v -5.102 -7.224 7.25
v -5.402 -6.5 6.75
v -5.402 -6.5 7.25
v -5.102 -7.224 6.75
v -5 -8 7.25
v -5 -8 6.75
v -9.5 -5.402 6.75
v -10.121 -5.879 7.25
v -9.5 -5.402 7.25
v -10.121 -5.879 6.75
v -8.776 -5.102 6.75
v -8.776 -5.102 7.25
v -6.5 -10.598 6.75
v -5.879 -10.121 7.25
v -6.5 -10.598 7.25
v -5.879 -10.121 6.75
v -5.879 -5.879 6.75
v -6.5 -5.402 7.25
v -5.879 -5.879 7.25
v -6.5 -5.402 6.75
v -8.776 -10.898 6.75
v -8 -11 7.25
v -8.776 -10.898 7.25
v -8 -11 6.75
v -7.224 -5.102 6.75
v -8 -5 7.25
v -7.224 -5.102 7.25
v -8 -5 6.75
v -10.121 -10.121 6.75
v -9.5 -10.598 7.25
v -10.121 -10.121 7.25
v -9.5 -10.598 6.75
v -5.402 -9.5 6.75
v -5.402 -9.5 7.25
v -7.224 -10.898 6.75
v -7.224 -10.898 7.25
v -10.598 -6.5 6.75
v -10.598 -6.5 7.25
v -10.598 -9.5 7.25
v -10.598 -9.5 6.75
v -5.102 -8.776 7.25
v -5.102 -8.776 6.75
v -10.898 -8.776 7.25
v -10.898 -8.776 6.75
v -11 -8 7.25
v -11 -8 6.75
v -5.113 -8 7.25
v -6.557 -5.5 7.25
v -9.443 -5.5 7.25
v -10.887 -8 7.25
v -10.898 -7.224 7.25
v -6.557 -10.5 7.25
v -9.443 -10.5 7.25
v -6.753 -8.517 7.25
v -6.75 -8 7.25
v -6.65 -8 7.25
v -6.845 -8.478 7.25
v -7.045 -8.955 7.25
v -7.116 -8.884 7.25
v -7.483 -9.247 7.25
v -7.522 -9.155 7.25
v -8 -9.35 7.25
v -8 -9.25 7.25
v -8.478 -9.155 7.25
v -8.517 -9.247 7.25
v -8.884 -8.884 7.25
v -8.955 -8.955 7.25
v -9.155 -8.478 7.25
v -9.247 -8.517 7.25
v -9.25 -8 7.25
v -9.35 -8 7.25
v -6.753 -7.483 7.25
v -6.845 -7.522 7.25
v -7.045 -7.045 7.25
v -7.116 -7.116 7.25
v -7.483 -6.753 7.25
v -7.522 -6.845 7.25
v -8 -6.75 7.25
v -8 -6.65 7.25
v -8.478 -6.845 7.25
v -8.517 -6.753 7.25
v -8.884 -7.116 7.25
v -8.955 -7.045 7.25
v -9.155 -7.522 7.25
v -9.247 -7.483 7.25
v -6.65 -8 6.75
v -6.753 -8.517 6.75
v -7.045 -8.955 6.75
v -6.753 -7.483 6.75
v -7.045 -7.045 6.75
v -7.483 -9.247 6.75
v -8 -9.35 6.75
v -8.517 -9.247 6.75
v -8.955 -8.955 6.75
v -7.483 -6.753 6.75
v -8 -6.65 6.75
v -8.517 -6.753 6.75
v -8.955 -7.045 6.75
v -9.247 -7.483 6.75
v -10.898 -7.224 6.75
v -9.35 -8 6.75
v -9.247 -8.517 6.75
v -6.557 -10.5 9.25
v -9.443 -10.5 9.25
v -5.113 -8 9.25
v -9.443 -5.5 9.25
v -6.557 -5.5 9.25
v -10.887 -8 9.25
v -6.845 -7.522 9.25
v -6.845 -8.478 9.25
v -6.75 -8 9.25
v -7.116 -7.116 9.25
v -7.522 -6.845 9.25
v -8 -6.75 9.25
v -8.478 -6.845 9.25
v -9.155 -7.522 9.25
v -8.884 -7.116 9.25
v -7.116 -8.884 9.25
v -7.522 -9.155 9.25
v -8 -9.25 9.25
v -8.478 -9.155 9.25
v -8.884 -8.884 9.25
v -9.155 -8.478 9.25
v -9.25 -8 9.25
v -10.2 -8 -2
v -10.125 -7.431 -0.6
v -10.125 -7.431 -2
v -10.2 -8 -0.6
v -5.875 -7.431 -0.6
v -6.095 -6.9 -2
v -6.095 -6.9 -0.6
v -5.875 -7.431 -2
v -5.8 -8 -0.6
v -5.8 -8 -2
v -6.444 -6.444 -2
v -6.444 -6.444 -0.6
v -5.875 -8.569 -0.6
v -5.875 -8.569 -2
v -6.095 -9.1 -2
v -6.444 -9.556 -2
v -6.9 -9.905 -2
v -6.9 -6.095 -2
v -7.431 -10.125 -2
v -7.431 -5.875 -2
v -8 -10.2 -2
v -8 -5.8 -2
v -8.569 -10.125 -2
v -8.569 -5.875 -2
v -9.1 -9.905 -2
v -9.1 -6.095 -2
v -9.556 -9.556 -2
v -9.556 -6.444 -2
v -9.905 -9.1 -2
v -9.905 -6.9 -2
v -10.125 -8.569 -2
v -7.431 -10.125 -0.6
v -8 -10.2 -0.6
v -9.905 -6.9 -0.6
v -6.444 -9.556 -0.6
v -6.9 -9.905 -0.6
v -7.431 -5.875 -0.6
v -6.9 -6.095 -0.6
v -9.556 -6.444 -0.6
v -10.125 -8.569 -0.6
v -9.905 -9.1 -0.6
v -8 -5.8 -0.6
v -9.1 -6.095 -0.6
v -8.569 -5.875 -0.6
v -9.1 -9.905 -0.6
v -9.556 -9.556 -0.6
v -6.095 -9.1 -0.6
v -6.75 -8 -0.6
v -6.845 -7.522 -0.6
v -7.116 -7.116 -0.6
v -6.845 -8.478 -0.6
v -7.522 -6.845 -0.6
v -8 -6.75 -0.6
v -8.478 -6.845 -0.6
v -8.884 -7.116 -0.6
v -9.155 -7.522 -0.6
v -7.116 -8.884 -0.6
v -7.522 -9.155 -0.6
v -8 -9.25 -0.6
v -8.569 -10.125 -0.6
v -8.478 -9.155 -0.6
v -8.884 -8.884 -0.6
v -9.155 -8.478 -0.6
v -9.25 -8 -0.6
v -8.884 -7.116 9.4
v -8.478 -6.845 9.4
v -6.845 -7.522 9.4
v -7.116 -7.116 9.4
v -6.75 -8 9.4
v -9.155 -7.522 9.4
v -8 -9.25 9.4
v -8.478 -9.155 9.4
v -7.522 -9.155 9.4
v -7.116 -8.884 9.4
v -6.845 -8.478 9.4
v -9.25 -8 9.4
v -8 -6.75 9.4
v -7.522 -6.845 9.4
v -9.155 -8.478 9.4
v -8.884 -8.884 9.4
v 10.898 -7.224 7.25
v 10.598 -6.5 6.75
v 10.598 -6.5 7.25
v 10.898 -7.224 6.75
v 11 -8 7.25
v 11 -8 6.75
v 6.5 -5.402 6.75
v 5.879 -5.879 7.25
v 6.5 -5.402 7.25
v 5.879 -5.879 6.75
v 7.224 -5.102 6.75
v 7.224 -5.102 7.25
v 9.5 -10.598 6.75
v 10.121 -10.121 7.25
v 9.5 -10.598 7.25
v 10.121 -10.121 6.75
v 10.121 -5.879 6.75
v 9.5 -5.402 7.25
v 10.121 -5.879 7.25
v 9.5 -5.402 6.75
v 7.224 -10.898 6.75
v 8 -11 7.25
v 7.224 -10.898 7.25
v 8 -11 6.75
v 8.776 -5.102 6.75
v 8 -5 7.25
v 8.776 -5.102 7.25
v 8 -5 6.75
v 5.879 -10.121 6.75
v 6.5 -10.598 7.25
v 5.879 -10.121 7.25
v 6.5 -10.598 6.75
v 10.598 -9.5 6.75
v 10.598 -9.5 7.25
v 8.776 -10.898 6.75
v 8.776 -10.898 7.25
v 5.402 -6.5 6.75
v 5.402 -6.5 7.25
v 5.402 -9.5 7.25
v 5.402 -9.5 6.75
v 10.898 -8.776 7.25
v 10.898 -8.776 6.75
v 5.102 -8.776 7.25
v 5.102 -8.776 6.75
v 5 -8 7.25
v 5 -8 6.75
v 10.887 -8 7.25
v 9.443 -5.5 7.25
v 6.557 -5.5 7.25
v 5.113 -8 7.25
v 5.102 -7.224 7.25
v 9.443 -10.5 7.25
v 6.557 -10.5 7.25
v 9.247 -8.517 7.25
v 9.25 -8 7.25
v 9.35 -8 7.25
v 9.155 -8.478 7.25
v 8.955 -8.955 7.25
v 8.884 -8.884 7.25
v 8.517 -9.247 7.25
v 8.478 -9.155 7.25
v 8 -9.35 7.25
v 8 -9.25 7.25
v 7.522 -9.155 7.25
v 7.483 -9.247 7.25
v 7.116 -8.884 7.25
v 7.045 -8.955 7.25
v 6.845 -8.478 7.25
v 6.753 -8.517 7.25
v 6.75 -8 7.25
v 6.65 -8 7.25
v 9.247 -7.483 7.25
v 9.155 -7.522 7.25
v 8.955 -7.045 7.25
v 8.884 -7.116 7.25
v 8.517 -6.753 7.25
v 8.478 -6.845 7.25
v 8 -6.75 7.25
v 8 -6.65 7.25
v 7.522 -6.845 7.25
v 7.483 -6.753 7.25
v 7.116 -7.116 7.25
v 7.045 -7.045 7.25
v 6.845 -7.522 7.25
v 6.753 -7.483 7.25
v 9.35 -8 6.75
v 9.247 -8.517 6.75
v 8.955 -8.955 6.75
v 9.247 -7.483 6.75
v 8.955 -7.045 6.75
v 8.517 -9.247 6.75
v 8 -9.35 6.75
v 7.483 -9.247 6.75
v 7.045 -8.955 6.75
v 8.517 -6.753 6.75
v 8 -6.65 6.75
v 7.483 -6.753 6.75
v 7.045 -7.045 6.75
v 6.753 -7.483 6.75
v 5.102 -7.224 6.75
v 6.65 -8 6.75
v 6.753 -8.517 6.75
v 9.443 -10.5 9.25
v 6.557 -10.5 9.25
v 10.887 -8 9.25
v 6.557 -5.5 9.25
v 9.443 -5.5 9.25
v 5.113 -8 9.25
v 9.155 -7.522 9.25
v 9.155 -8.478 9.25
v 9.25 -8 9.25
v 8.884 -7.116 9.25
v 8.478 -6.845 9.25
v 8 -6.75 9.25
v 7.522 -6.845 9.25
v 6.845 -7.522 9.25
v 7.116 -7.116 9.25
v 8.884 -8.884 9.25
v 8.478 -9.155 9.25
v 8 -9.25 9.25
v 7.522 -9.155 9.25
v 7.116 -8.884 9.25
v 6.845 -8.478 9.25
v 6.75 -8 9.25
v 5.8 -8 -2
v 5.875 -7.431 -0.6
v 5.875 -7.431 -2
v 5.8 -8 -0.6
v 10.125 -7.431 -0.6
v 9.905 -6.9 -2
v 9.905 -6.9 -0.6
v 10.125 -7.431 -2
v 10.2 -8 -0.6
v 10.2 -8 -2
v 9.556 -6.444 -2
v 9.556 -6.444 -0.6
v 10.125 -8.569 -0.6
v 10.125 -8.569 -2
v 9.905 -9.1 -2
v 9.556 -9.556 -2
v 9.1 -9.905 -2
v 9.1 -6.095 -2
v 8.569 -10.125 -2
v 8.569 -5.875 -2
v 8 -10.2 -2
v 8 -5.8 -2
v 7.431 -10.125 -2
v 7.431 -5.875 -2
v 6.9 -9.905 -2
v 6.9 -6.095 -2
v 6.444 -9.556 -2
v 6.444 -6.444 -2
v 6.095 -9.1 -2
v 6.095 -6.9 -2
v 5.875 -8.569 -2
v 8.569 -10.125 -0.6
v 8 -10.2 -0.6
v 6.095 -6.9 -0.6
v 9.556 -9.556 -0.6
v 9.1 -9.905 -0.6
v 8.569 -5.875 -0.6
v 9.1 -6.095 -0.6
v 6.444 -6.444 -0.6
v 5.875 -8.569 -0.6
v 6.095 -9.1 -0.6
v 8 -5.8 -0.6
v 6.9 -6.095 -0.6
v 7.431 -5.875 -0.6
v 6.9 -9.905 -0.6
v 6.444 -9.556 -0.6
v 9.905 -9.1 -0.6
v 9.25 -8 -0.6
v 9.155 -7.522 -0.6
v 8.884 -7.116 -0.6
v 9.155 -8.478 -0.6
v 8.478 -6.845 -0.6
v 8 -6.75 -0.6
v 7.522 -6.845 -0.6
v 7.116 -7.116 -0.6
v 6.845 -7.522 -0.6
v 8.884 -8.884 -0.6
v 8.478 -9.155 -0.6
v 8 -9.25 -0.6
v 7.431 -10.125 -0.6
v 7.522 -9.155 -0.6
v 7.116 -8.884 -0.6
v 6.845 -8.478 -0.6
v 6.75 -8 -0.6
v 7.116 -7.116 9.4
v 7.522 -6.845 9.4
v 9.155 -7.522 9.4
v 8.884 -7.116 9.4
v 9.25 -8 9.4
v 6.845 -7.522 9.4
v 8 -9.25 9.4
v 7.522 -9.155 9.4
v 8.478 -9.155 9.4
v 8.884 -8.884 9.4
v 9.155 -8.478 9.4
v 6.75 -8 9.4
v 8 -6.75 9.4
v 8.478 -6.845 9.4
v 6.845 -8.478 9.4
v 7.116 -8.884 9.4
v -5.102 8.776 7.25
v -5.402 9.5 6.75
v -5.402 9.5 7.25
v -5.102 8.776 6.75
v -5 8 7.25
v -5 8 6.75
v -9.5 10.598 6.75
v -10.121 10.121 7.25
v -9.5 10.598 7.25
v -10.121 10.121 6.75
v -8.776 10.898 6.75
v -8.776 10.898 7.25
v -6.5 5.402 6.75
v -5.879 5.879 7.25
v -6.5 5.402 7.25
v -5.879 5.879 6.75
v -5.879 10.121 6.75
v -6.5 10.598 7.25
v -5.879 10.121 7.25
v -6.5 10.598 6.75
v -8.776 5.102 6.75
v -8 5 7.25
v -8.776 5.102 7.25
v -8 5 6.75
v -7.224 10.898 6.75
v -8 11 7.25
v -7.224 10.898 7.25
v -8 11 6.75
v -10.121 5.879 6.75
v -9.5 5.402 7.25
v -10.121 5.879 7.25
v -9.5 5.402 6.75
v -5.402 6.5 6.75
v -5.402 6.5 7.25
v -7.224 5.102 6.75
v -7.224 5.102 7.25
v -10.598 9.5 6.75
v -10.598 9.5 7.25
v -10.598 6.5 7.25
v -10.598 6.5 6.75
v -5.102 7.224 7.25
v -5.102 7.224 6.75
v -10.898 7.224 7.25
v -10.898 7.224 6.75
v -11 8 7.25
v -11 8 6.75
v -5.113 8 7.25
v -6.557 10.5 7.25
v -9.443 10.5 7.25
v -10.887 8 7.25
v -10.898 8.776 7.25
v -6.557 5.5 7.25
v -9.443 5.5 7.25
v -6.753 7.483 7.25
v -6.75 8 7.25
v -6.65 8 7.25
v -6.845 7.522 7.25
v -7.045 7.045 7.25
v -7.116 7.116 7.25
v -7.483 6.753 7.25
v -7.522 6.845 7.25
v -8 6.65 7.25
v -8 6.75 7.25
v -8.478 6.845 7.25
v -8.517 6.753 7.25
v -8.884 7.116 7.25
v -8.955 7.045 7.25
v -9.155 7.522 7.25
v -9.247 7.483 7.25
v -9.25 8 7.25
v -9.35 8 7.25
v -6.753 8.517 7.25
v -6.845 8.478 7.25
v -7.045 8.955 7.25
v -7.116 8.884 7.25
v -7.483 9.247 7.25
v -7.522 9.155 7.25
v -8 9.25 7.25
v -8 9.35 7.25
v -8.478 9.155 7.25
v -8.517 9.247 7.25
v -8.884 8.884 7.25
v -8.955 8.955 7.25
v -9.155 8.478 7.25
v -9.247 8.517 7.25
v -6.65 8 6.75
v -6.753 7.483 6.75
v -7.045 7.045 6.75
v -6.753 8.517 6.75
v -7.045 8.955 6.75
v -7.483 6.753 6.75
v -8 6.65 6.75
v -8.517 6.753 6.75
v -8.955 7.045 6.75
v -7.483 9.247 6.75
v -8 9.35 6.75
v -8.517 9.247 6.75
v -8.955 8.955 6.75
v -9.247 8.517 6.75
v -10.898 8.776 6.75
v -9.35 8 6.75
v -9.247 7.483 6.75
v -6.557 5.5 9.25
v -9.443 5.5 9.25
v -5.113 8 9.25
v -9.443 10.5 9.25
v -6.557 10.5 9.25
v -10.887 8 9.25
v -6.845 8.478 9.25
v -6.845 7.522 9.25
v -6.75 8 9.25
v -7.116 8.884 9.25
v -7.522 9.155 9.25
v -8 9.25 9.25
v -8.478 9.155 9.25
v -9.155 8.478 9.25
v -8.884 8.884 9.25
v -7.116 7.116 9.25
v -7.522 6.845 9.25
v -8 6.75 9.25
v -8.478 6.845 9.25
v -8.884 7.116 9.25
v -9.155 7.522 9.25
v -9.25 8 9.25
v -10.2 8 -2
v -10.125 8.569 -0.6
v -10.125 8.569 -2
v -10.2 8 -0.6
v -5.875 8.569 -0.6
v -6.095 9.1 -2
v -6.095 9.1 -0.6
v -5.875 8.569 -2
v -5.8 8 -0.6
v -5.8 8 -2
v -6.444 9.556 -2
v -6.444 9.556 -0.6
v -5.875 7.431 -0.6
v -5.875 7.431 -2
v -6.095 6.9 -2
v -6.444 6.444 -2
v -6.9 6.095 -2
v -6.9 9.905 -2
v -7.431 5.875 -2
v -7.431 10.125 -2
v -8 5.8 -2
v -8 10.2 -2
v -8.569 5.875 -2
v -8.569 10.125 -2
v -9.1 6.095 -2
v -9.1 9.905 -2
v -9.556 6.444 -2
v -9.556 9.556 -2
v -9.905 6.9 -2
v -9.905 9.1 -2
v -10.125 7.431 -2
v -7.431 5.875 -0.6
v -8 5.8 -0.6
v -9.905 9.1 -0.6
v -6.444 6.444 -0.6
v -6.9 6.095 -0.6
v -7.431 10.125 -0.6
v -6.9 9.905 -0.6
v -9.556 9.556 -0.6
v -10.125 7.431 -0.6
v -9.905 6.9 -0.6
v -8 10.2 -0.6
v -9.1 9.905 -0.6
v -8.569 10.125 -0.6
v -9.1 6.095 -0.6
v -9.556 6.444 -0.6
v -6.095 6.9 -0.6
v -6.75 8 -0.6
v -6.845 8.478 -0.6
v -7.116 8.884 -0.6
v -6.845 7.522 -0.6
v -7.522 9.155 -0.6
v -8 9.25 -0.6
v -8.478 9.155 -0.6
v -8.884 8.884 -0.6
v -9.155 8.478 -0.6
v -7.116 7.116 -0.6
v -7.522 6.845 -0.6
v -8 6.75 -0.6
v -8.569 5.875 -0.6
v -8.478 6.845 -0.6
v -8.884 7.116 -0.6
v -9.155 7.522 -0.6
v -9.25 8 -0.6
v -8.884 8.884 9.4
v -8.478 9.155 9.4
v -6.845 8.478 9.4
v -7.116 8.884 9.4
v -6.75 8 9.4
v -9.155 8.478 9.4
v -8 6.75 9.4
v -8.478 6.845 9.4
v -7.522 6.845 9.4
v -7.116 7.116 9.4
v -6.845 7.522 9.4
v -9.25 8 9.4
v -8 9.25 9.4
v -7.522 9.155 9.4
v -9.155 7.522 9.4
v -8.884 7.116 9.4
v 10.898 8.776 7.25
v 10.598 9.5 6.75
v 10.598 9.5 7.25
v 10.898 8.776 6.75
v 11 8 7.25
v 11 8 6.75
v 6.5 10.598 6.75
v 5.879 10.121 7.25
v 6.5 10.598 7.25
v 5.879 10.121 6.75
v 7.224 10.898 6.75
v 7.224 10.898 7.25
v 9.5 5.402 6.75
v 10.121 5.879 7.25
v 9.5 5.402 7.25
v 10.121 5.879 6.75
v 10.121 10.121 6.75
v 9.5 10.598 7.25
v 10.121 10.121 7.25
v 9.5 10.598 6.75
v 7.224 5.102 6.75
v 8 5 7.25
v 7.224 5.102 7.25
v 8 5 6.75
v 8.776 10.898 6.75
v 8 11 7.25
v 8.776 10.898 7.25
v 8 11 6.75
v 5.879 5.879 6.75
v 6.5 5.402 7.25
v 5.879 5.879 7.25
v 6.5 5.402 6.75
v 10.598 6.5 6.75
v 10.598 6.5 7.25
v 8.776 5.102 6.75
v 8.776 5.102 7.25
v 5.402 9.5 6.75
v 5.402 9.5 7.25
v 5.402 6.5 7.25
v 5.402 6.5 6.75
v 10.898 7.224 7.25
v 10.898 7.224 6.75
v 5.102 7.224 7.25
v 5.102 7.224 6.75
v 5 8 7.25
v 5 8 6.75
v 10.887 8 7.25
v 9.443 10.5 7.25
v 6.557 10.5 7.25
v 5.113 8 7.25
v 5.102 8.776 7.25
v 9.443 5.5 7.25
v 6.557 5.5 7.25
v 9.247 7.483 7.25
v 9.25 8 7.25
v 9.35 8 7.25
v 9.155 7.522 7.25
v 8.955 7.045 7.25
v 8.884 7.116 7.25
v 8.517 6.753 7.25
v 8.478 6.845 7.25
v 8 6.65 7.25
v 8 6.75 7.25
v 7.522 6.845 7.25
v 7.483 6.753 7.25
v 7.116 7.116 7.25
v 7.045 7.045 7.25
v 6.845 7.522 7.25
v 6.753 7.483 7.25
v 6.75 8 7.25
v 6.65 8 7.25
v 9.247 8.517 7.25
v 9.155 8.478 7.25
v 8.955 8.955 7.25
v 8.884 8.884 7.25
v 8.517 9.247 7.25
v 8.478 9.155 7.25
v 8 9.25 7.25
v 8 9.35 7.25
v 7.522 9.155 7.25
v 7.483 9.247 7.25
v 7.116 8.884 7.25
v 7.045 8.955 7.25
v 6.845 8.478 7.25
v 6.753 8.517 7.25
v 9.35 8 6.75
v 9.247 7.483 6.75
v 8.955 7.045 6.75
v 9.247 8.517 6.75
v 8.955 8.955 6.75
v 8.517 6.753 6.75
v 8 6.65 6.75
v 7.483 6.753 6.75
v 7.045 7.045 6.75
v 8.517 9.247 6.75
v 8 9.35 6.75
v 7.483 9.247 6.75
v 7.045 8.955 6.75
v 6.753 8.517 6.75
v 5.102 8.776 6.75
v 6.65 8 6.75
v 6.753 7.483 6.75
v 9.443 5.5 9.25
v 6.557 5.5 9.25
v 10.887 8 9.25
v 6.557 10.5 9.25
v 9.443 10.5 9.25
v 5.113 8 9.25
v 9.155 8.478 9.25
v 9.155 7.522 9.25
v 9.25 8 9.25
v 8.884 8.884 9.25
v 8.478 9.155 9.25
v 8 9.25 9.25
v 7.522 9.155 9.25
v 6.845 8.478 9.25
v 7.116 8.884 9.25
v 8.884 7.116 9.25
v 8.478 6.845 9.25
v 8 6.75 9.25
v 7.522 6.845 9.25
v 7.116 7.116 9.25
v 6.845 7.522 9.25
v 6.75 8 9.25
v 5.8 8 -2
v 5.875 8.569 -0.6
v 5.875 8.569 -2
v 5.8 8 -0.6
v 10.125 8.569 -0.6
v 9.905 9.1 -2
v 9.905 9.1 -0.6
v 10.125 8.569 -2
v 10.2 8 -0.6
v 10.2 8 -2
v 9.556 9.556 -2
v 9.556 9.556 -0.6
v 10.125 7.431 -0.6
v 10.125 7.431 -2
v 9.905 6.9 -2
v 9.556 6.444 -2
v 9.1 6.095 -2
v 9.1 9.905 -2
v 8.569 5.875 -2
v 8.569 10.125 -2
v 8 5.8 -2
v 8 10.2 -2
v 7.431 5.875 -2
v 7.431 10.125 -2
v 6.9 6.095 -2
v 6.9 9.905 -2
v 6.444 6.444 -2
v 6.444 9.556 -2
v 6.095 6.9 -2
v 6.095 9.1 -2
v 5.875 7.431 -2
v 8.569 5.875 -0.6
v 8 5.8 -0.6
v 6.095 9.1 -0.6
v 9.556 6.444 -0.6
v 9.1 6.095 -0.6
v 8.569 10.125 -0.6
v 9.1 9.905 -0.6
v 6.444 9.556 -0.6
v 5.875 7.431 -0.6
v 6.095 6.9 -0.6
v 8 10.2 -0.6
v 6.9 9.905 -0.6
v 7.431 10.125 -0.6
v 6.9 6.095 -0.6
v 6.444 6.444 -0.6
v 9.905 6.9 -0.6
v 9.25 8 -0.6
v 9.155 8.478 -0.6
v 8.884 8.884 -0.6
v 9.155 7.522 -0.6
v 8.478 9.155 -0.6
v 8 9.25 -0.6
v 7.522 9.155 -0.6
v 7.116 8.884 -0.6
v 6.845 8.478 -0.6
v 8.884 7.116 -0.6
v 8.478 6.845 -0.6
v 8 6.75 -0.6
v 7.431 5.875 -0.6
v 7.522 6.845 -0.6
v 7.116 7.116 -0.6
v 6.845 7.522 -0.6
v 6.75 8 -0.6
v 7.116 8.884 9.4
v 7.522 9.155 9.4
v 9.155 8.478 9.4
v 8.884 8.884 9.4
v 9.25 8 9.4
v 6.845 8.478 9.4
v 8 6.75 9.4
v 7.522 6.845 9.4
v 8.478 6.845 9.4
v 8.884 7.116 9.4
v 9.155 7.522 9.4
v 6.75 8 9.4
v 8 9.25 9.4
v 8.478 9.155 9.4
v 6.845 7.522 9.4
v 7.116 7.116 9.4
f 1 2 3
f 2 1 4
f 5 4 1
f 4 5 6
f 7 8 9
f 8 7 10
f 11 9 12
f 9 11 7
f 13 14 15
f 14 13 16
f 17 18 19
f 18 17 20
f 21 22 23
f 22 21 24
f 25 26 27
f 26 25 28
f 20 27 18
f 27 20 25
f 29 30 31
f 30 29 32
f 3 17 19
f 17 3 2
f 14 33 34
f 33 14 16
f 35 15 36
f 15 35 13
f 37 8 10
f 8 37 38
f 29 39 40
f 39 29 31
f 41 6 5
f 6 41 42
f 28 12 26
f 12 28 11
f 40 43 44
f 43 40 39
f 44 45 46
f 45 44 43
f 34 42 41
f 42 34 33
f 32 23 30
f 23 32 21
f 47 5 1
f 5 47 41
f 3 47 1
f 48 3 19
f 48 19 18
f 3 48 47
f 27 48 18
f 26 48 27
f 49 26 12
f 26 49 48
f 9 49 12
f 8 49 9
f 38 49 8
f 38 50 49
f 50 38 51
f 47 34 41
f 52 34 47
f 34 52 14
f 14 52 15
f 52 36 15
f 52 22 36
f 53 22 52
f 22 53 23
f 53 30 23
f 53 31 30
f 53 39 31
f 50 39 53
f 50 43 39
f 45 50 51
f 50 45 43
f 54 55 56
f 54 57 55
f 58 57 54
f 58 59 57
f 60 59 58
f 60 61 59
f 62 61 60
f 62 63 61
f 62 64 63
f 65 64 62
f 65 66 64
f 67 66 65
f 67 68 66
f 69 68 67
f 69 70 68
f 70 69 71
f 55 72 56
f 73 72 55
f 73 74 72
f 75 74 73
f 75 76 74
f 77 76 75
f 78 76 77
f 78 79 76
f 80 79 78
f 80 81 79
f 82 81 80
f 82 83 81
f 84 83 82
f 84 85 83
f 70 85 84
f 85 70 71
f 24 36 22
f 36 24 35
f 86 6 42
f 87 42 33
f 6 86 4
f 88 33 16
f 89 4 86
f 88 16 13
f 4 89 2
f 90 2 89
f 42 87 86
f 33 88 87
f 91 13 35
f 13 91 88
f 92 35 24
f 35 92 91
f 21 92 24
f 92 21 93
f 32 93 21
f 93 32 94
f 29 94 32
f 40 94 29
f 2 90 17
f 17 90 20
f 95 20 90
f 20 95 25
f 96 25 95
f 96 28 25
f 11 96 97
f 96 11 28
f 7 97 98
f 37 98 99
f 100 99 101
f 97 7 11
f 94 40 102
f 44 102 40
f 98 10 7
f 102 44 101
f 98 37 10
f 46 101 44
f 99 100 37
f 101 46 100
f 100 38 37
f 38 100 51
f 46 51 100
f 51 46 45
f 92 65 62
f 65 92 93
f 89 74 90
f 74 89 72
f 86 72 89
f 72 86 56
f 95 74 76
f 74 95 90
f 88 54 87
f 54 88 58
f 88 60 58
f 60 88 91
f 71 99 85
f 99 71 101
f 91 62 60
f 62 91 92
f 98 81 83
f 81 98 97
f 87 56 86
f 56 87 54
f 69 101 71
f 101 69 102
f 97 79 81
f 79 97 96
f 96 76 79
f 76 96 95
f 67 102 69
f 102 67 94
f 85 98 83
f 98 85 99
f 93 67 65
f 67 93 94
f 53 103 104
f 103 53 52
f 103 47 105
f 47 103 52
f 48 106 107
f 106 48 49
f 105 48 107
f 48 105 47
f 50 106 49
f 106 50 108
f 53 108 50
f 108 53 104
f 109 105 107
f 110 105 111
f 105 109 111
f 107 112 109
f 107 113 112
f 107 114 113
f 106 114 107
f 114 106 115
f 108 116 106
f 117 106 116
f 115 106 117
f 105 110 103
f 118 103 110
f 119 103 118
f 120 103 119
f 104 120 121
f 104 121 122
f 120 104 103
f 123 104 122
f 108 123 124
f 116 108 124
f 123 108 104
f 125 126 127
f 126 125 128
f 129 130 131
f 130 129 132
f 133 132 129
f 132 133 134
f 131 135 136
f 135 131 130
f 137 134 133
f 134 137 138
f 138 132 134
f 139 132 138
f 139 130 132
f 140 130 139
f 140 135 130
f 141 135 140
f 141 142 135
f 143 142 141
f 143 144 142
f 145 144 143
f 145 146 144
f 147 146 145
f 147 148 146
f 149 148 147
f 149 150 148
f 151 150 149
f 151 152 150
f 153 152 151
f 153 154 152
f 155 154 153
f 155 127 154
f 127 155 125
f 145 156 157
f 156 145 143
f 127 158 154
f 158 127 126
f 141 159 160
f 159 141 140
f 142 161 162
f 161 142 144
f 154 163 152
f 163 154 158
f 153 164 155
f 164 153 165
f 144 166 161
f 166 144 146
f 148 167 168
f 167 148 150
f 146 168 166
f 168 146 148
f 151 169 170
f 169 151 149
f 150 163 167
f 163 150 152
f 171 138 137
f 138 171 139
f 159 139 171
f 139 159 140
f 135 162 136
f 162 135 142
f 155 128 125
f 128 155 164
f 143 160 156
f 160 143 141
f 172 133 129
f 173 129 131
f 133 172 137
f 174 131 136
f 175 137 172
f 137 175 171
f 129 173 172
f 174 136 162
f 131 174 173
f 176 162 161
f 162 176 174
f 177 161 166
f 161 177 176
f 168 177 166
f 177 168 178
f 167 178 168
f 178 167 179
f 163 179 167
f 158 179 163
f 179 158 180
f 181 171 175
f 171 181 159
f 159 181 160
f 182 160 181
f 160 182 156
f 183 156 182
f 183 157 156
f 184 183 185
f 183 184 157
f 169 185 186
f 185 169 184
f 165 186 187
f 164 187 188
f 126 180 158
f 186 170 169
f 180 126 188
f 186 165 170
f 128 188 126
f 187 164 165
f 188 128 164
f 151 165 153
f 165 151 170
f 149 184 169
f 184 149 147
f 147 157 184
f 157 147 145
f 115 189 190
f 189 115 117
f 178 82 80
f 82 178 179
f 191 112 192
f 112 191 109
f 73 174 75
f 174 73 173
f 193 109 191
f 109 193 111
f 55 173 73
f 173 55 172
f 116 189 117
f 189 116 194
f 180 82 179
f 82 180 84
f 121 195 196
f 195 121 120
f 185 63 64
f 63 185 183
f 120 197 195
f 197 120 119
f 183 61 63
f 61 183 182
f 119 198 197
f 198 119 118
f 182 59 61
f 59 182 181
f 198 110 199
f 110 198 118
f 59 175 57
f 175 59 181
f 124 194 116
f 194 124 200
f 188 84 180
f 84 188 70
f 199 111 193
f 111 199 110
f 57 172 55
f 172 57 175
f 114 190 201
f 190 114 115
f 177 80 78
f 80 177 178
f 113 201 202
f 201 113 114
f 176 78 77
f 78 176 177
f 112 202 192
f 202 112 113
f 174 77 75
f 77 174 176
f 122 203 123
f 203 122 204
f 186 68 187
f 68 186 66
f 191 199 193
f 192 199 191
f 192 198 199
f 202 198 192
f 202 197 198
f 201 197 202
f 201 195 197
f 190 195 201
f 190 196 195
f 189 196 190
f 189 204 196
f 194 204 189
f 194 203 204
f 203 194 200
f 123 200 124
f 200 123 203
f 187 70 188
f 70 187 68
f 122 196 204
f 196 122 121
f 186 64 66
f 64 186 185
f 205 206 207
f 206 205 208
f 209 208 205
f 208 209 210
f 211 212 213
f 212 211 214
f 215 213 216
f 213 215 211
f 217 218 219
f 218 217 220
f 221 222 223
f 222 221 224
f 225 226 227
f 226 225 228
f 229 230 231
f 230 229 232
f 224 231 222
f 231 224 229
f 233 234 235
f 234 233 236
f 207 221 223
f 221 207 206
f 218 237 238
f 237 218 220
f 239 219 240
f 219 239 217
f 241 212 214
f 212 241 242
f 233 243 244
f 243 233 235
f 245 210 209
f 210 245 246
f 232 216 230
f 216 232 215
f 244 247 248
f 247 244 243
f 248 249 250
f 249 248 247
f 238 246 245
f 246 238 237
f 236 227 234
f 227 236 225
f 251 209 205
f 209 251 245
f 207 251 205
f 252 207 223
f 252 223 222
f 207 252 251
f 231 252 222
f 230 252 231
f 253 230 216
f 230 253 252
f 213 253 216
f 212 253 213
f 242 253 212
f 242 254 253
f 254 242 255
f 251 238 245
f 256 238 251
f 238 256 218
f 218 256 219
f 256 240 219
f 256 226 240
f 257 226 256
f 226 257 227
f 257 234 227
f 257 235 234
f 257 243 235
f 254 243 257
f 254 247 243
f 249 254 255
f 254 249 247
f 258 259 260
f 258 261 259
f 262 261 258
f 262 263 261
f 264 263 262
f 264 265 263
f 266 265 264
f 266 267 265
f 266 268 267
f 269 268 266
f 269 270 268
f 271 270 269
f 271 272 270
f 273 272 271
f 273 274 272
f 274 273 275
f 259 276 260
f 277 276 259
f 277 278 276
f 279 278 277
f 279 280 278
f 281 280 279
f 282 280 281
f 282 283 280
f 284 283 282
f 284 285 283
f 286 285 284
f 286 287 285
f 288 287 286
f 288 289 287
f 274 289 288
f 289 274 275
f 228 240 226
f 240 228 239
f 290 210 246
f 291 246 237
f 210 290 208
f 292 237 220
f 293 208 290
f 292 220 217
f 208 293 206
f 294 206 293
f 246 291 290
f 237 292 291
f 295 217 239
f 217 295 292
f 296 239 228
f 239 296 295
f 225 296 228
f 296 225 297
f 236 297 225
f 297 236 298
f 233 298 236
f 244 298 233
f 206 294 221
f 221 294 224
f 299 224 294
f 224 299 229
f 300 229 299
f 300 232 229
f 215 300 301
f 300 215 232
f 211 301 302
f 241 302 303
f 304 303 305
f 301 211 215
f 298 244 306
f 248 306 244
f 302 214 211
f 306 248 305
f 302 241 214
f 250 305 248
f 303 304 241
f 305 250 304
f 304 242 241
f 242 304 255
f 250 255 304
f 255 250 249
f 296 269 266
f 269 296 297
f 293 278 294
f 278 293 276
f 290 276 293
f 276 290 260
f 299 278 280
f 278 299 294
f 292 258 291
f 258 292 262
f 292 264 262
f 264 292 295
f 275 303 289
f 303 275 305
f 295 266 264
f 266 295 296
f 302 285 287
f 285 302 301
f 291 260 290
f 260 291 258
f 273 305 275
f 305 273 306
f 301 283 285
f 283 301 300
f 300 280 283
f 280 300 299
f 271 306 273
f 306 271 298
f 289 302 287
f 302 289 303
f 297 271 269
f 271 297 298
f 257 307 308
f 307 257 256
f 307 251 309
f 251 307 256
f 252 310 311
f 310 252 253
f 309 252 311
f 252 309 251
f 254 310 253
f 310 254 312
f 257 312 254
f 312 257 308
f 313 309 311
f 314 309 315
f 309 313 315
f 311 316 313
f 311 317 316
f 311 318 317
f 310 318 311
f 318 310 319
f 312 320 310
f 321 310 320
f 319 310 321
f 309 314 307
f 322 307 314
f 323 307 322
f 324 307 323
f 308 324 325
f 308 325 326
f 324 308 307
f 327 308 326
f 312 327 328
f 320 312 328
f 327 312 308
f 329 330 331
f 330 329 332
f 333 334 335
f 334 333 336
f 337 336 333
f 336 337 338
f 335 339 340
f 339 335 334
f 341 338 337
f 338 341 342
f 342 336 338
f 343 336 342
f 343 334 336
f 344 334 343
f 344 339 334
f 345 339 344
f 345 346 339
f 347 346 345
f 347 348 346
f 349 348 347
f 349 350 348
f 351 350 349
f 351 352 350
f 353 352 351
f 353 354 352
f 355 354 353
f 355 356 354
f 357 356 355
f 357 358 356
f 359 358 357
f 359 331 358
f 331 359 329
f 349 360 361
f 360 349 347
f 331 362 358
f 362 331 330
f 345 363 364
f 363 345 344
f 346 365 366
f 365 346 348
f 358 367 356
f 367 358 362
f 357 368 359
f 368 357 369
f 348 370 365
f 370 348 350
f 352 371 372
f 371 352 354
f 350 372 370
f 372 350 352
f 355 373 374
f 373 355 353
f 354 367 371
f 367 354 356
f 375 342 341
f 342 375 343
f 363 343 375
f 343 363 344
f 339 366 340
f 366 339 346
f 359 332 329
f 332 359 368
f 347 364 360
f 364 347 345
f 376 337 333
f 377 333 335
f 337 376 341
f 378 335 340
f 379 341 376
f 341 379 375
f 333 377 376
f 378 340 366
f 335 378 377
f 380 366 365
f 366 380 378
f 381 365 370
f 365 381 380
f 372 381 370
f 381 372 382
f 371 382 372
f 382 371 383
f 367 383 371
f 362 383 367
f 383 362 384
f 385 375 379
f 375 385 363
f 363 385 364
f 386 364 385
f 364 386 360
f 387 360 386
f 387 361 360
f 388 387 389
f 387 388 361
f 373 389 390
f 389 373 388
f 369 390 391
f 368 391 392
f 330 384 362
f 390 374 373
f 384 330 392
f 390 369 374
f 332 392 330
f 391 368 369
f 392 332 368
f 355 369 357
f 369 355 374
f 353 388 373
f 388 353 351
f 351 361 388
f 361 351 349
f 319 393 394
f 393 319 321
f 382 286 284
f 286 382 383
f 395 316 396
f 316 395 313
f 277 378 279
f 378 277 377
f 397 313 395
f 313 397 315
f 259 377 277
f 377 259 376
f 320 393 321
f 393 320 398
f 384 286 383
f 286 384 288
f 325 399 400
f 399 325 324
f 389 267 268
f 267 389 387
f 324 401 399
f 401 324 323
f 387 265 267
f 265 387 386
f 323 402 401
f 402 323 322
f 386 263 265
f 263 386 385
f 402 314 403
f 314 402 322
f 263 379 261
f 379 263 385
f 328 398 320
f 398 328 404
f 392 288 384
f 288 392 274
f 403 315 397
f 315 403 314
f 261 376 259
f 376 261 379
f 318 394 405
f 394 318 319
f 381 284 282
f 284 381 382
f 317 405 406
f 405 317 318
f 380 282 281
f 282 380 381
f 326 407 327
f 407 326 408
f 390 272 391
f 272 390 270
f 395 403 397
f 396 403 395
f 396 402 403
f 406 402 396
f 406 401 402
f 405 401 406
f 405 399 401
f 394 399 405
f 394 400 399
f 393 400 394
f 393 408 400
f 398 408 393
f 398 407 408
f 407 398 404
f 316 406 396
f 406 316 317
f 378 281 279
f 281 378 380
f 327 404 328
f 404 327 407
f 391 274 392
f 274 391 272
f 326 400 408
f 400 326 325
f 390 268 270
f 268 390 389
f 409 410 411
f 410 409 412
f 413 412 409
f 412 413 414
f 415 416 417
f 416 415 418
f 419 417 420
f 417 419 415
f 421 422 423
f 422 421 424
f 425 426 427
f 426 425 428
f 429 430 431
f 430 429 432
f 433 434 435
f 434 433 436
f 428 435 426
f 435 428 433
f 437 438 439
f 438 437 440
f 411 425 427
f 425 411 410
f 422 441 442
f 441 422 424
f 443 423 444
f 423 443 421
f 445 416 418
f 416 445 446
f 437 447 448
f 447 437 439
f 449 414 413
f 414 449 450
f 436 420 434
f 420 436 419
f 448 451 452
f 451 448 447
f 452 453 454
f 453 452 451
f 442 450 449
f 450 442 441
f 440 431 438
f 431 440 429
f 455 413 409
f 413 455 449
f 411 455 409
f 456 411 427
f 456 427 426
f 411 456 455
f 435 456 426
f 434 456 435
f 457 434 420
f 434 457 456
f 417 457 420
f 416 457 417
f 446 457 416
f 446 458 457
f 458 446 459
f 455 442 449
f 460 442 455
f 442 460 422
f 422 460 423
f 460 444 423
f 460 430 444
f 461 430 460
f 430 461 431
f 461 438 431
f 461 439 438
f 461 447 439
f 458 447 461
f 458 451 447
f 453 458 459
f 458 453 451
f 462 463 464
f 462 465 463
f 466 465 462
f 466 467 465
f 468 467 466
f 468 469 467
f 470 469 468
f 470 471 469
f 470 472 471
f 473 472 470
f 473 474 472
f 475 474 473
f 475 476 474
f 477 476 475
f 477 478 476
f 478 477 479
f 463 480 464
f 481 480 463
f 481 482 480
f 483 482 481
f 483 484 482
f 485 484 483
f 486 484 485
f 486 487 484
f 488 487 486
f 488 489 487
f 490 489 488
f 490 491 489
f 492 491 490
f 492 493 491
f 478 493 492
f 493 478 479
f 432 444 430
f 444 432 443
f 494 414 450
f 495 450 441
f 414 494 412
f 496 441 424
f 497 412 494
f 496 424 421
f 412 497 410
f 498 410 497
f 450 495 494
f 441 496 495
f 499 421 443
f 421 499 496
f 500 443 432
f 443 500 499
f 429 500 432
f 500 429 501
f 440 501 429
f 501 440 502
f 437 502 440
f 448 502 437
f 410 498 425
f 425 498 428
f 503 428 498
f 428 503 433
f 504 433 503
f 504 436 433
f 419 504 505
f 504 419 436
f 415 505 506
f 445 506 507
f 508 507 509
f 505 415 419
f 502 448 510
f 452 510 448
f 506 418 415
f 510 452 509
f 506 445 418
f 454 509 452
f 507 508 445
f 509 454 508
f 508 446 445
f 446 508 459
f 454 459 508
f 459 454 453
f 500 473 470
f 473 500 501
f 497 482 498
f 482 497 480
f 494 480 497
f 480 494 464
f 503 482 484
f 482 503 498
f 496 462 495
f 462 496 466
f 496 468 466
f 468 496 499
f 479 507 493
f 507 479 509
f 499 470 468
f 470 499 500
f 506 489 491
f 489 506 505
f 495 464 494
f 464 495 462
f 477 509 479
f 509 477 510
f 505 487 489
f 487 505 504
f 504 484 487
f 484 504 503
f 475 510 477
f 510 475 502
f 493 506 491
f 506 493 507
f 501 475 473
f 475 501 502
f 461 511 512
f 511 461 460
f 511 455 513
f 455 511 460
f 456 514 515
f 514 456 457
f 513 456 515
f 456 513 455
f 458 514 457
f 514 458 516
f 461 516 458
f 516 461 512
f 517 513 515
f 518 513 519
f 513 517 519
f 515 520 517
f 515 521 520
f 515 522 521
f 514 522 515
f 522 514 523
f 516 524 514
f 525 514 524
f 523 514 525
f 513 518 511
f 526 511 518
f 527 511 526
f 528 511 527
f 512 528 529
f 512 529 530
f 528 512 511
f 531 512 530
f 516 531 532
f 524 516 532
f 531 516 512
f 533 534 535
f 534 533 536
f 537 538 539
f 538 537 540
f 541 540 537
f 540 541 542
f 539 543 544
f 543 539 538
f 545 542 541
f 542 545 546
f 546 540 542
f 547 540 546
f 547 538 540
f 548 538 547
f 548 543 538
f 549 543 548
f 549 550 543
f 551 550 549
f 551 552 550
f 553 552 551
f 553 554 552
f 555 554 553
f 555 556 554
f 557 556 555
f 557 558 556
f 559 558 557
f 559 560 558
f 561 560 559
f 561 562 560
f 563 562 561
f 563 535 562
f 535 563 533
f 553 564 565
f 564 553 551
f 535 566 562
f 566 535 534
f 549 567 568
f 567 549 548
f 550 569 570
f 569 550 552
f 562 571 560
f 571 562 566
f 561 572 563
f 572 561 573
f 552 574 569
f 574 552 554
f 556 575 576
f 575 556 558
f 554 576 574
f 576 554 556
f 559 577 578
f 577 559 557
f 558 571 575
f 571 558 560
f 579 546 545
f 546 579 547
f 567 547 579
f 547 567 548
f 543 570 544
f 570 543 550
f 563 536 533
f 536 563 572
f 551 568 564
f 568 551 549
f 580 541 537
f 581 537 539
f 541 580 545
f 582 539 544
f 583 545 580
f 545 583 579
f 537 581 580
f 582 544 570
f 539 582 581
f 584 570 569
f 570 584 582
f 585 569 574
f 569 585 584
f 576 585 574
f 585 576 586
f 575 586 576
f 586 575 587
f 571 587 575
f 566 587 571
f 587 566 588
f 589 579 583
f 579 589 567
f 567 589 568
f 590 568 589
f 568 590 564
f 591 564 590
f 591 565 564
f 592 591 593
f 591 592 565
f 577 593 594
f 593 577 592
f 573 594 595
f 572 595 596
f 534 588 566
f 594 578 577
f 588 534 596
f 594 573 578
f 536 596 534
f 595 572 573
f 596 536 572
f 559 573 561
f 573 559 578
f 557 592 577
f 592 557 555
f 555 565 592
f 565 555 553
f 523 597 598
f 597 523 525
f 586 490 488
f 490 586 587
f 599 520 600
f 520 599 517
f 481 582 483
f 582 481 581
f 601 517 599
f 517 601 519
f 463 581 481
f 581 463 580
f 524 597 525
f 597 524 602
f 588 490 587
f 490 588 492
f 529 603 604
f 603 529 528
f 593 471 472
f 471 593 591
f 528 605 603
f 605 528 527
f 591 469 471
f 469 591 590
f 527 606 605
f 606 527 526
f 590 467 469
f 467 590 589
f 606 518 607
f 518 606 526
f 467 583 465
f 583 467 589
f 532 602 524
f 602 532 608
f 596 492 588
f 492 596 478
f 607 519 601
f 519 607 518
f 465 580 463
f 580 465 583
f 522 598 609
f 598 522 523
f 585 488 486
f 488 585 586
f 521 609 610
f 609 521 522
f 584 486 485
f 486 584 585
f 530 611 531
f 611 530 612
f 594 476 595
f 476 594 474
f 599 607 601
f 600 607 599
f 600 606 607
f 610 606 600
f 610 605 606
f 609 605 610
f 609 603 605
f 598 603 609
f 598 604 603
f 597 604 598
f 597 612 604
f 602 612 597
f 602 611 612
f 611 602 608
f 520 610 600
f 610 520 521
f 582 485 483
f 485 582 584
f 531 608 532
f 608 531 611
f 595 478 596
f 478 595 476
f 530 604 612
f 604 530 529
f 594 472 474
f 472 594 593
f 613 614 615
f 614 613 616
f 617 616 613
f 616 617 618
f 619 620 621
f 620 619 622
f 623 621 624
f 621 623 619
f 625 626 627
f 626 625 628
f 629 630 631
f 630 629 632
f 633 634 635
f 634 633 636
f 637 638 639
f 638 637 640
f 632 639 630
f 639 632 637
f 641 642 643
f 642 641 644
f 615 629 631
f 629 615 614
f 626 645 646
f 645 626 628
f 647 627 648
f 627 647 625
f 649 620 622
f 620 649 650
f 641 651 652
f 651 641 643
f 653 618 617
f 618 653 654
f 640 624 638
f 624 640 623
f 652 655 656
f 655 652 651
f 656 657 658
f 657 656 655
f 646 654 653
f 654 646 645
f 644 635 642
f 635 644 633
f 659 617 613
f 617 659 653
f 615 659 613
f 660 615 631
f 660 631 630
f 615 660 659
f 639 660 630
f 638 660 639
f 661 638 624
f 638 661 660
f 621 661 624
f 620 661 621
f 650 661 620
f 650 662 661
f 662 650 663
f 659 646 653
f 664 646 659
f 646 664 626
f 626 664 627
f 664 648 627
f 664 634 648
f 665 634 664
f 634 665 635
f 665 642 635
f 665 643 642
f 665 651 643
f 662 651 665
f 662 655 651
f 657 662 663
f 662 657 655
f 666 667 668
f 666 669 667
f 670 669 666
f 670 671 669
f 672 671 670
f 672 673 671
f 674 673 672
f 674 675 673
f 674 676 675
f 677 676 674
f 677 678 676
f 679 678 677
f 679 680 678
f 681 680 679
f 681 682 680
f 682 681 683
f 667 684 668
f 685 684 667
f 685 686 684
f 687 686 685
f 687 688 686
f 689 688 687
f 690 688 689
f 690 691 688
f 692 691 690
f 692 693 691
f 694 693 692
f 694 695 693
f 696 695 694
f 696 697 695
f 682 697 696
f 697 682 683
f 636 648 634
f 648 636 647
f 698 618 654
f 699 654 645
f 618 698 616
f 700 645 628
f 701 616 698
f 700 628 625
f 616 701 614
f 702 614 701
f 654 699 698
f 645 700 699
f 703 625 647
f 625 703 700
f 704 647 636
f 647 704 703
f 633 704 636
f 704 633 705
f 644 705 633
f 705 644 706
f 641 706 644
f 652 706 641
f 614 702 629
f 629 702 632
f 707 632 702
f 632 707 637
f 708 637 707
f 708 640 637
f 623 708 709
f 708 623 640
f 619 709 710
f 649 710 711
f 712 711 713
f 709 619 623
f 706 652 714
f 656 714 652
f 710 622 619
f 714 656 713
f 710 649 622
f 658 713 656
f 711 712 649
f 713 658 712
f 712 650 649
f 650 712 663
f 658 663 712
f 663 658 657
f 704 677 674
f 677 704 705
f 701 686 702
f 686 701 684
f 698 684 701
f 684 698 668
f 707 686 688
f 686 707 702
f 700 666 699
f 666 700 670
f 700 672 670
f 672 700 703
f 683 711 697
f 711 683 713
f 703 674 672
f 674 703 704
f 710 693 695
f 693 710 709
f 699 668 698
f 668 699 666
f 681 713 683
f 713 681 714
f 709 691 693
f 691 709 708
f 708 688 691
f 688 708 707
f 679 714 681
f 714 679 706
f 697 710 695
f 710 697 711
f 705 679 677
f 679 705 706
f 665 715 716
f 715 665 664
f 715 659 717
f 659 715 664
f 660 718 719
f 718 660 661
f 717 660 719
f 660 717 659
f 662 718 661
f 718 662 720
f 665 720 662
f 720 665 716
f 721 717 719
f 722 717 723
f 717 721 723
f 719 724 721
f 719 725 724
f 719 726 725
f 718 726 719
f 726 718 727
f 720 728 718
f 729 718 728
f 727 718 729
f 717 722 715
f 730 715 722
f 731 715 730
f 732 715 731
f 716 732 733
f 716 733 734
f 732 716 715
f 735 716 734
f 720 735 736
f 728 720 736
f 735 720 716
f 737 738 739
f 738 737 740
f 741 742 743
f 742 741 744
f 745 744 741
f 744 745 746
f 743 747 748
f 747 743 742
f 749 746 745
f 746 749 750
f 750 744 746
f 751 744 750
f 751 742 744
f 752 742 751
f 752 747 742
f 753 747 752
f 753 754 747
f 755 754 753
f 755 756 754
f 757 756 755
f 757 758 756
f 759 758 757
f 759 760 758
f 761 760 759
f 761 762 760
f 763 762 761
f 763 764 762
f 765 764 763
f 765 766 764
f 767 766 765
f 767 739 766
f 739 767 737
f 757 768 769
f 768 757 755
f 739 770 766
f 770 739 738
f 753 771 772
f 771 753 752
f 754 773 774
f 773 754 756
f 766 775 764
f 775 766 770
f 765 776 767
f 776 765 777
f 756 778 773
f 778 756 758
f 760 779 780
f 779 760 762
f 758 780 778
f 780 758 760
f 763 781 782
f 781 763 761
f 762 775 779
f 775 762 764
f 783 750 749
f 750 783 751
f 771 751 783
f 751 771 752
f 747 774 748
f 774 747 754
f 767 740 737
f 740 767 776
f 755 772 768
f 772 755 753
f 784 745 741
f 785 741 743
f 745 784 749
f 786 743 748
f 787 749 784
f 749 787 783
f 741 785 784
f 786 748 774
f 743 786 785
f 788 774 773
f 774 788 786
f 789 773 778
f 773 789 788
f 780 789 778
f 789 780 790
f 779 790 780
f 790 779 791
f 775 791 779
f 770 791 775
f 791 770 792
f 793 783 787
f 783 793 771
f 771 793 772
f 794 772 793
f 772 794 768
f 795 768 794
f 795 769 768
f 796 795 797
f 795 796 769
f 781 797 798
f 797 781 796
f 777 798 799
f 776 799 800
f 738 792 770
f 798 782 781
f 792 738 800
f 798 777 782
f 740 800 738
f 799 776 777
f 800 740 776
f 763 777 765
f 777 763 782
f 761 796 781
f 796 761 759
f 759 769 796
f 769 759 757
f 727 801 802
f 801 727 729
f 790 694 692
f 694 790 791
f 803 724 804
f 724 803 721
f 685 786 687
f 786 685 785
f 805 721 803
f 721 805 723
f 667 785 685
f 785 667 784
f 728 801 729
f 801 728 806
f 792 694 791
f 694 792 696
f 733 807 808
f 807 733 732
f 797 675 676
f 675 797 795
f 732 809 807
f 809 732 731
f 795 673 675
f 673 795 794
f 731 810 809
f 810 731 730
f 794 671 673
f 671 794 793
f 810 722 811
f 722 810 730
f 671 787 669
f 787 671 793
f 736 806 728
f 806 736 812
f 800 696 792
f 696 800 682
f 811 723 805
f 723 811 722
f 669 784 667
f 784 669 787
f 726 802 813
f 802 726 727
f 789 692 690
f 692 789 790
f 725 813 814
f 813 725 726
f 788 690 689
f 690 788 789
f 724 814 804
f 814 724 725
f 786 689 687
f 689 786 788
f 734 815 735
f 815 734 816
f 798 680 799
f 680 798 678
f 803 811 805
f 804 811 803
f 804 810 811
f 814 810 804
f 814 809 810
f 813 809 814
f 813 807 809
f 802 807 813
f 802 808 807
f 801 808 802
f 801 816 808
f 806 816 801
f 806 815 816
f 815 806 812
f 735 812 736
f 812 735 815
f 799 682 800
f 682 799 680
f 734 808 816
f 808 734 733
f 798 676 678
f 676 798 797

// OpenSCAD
// file: ../../screw-post/screw-post.scad
//-----------------------------------------------------------------------
// Screw post: a round post off the floor that a board screws down onto
//
// Two ways to fix:
//   "nut"  clearance hole through the post and floor; the nut sits in a hex
//          trap in the floor's underside, so the screw goes in from the top
//   "tap"  a pilot hole the screw cuts its own thread in (one or two fittings
//          in PLA/PETG); blind, the floor stays whole underneath
// and "head" for a screw up from below (head in a counterbore, nut on top).
//
// Modules, all in the same frame:
//   screwPostGhost()     the screw (and nut), for previews
//   screwPost()          the post: add to the floor
//   screwPostFloorCut()  subtract from the floor: nut trap / counterbore and hole
//
// Frame: origin on the floor top, on the post's axis. Z up; the floor is
// Z = -floorThick .. 0. Units: mm.
//
// Sizes: "M2", "M2.5", "M3". screwPostScrew(size, ...) says which screw length
// reaches, so a project can assert it has that screw in the kit.
//-----------------------------------------------------------------------

//-- [name, screw Ø, nut across flats, nut thick, head Ø, head height, tap hole, post Ø]
//-- Nuts ISO 4032; heads ISO 7380 button. Tap holes: the usual ~0.8 x Ø for plastic
screwSizes = [
  ["M2",   2.0, 4.0, 1.6, 3.5, 1.1, 1.6, 5.0],
  ["M2.5", 2.5, 5.0, 2.0, 4.4, 1.4, 2.1, 6.0],    // head 4.4: measured on the kit's M2.5 (controller base)
  ["M3",   3.0, 5.5, 2.4, 5.7, 1.65, 2.5, 7.0],
];

screwHoleClear = 0.4;     // added to the screw Ø for a clearance hole
screwNutClear  = 0.3;     // CAL: across flats, nut trap over the nut. Set by the fit piece
screwTapClear  = 0.0;     // CAL: added to the tap hole. Set by the fit piece
screwHeadClear = 0.6;     // counterbore over the head Ø

function screwSize(size) = let (i = search([size], screwSizes)[0])
  assert(i != [] && i != undef, str("unknown screw size ", size)) screwSizes[i];
function screwDia(size)    = screwSize(size)[1];
function screwNutAF(size)  = screwSize(size)[2];
function screwNutH(size)   = screwSize(size)[3];
function screwHeadDia(size)= screwSize(size)[4];
function screwHeadH(size)  = screwSize(size)[5];
function screwPostDia(size)= screwSize(size)[7];

//-- Shortest screw that fills the nut, from the top of the clamped part (h + clamp
//-- above the floor) down to the nut trap's underside. Round up to a length you have.
function screwPostScrew(size, h, floorThick, clamp = 1.6) = h + clamp + floorThick;

module screwPostGhost(size, h, floorThick, clamp = 1.6, length, how = "nut")
{
  d = screwDia(size);
  L = is_undef(length) ? screwPostScrew(size, h, floorThick, clamp) : length;
  top = h + clamp;
  if (how == "head")
  {
    %color("Silver") translate([0, 0, -floorThick]) cylinder(d = screwHeadDia(size), h = screwHeadH(size), $fn = 24);
    %color("Silver") translate([0, 0, -floorThick + screwHeadH(size)]) cylinder(d = d, h = L, $fn = 16);
  }
  else
  {
    %color("Silver") translate([0, 0, top]) cylinder(d = screwHeadDia(size), h = screwHeadH(size), $fn = 24);
    %color("Silver") translate([0, 0, top - L]) cylinder(d = d, h = L, $fn = 16);
    if (how == "nut")
      %color("DimGray") translate([0, 0, -floorThick]) rotate([0, 0, 30]) cylinder(d = screwNutAF(size)/cos(30), h = screwNutH(size), $fn = 6);
  }
}

//-- how: "nut" | "head" (through hole) or "tap" (blind pilot hole). postDia defaults by size
module screwPost(size, h, how = "nut", postDia, tapClear = screwTapClear)
{
  pd = is_undef(postDia) ? screwPostDia(size) : postDia;
  hole = how == "tap" ? screwSize(size)[6] + tapClear : screwDia(size) + screwHoleClear;
  difference()
  {
    translate([0, 0, -0.01]) cylinder(d = pd, h = h + 0.01, $fn = 40);
    translate([0, 0, how == "tap" ? 0.6 : -1]) cylinder(d = hole, h = h + 2, $fn = 24);
    //-- lead-in so the screw starts square
    translate([0, 0, h - 0.4]) cylinder(d1 = hole, d2 = hole + 0.8, h = 0.41, $fn = 24);
  }
}

//-- "nut": hex trap from the underside, opening a little over the nut so it sits flush.
//-- "head": counterbore for the head. "tap": nothing.
module screwPostFloorCut(size, floorThick, how = "nut", nutClear = screwNutClear)
{
  d = screwDia(size) + screwHoleClear;
  if (how == "nut")
  {
    af = screwNutAF(size) + nutClear;
    translate([0, 0, -floorThick - 1]) rotate([0, 0, 30]) cylinder(d = af/cos(30), h = screwNutH(size) + 0.1 + 1, $fn = 6);
    translate([0, 0, -floorThick - 1]) cylinder(d = d + 0.4, h = floorThick + 2, $fn = 24);
  }
  if (how == "head")
  {
    translate([0, 0, -floorThick - 1]) cylinder(d = screwHeadDia(size) + screwHeadClear, h = screwHeadH(size) + 0.2 + 1, $fn = 32);
    translate([0, 0, -floorThick - 1]) cylinder(d = d + 0.4, h = floorThick + 2, $fn = 24);
  }
  assert(how == "tap" || floorThick >= (how == "nut" ? screwNutH(size) : screwHeadH(size)) + 0.1 + 0.3,
         str("floor too thin for the ", size, " ", how));
}
// file: ../as5600-mount.scad
//-----------------------------------------------------------------------
// AS5600 magnetic encoder board, held under a magnet on a spindle tip
//
// The board lies component side up, the AS5600 facing the magnet above it.
// Four screw posts take its weight: stainless M2.5 screws come UP from below,
// heads in counterbores in the floor's underside, with a stainless washer
// and nut on top of the board (stainless: carbon steel near the magnet
// bends its field). Four corner lips round the board's outline locate it:
// the holes are oversize and not placed well enough to hold the magnet
// axis within 0.25 of the IC, so they only clamp. Round boards get three
// arc lips instead of corners.
//
// The post height comes from the magnet: as56PostH(magnetFaceZ) puts the
// IC's top `gap` below the magnet's face.
//
// Modules, all in the same frame:
//   as56Ghost()      the board, IC and magnet, for previews
//   as56Holder()     the plastic: four posts and the locating lips
//   as56FloorCut()   subtract from the floor: counterbores and holes (and
//                    a slot for header pins pointing down, if asked)
//
// Frame: origin on the floor top, on the magnet axis (the IC's centre).
// Z up; the floor is Z = -floorThick .. 0. Board edges along X and Y.
// Units: mm.
//
// Boards come from as56Boards by name, or pass a row of your own in the
// same layout. Magnets come from as56Magnets by name, or pass a thickness.
//-----------------------------------------------------------------------

use <../screw-post/screw-post.scad>

//-- Boards: [name, shape, size, pcb, holes, hole Ø, screw, source]
//-- shape "rect": size [x, y]; "round": size [Ø]. Holes [x, y] from the IC's centre,
//-- which is the magnet axis; hole Ø one per hole (ghost only: the lips locate).
as56Boards = [
  //-- DollaTek B0BGPF3WT3 / JYUDAUFU B0DJ77DS4J, measured 2026-10-21 (the controller project's parts sheet).
  //-- 3 x Ø3.5 + 1 x Ø4.0 (by DIR); hole edges 1.75 in, so centres 3.5 in, 16.0 pitch; IC centred
  ["as5600-23",  "rect", [23, 23],   1.6, [[-8, -8], [8, -8], [-8, 8], [8, 8]], [3.5, 3.5, 3.5, 4.0], "M2.5", "measured"],
  //-- small breakout, 20 x 13.5, 2 x M3 holes on 15 pitch (vendor listing). CAL: PCB, hole Ø, IC centred
  ["as5600-20",  "rect", [20, 13.5], 1.6, [[-7.5, 0], [7.5, 0]],                [3.2, 3.2],           "M2.5", "V, CAL"],
  //-- round board: placeholder only, no source found. CAL: everything
  ["round-cal",  "round", [20],      1.6, [[-7, 0], [7, 0]],                    [3.2, 3.2],           "M2.5", "CAL"],
];

//-- Magnets: [name, Ø, thickness], diametrically magnetised discs
as56Magnets = [
  ["6x2.5", 6, 2.5],    // the size usually bundled with AS5600 boards. CAL what's in the packs
  ["6x1",   6, 1.0],    // the BOM's separate discs; the controller project's base default. CAL
];

//-- The sensor (AS5600 datasheet)
as56IcL        = 4.9;     // SOIC-8 body
as56IcW        = 3.9;
as56IcH        = 1.75;    // max, PCB to package top
as56Gap        = 1.5;     // magnet face to package top: datasheet 0.5..3; 1.5 mid-range
as56AxisTol    = 0.25;    // magnet axis to IC centre, max (datasheet)

//-- The mount
as56Clearance  = 0.15;    // CAL: per side, board outline to lips. Set by the fit piece
as56LipWall    = 1.6;
as56LipLeg     = 5;       // rect boards: lip length along each edge from a corner
as56LipArc     = 40;      // round boards: degrees per lip, three lips
as56LipH       = 1.0;     // lip top above the PCB underside (under the PCB top: nothing to snag)
as56FloorThick = 2.0;     // takes the M2.5 head counterbore (1.4 head + 0.2, 0.3 left)
as56WasherT    = 0.5;     // M2.5 washer, ISO 7089: Ø6 x 0.5
as56WasherD    = 6.0;
as56HeaderSlot = [17, 9]; // floor opening for header pins out the back: clears the rows at x -6.8 / +6.41

function as56Row(table, name) = let (i = search([name], table)[0])
  assert(i != [] && i != undef, str("unknown AS5600 name ", name)) table[i];
function as56Board(board) = is_string(board) ? as56Row(as56Boards, board) : board;
function as56MagnetT(magnet) = is_string(magnet) ? as56Row(as56Magnets, magnet)[2] : magnet;
function as56MagnetD(magnet) = is_string(magnet) ? as56Row(as56Magnets, magnet)[1] : 6;

//-- Magnet face Z for a magnet stuck on a spindle tip at tipZ (both above the floor top)
function as56MagnetFaceZ(tipZ, magnet = "6x1") = tipZ - as56MagnetT(magnet);
//-- Post height (floor top to PCB underside) that puts the IC's top `gap` under the magnet face
function as56PostH(magnetFaceZ, gap = as56Gap, board = "as5600-23") =
  magnetFaceZ - gap - as56IcH - as56Board(board)[3];
//-- Shortest screw (length under the head) from the head, flush in the floor's underside,
//-- up through the post, PCB, washer and nut. Round up to a length you have
function as56Screw(postH, floorThick = as56FloorThick, board = "as5600-23") =
  let (b = as56Board(board), s = b[6])
  floorThick - screwHeadH(s) + postH + b[3] + as56WasherT + screwNutH(s);
//-- Z of a screw's tip above the floor top: keep it clear of the magnet and spindle
function as56ScrewTipZ(length, floorThick = as56FloorThick, board = "as5600-23") =
  -floorThick + screwHeadH(as56Board(board)[6]) + length;

module as56Outline(board, grow = 0)
{
  b = as56Board(board);
  if (b[1] == "round") offset(r = grow, $fn = 64) circle(d = b[2][0], $fn = 64);
  else offset(delta = grow) square(b[2], center = true);
}

//-- where the lips go: corners of a rect board, three arcs round a round one
module as56LipZones(board, clearance)
{
  b = as56Board(board);
  R = 50;
  if (b[1] == "round")
    for (a = [90, 210, 330]) rotate(a - as56LipArc/2)
      polygon([[0, 0], [R, 0], for (t = [0 : 5 : as56LipArc]) R*[cos(t), sin(t)], R*[cos(as56LipArc), sin(as56LipArc)]]);
  else
    for (sx = [-1, 1], sy = [-1, 1])
    {
      leg = min(as56LipLeg, min(b[2])/2 - 1);
      translate([sx*b[2][0]/2, sy*b[2][1]/2])
        mirror([sx < 0 ? 1 : 0, 0]) mirror([0, sy < 0 ? 1 : 0])
          translate([-leg, -leg]) square([leg + clearance + as56LipWall + 1, leg + clearance + as56LipWall + 1]);
    }
}

//-- postH: floor top to PCB underside (as56PostH). magnetFaceZ: for the ghost's magnet
module as56Ghost(postH, board = "as5600-23", magnet = "6x1", gap = as56Gap)
{
  b = as56Board(board);
  %color("Purple") difference()
  {
    translate([0, 0, postH]) linear_extrude(b[3]) as56Outline(board);
    for (i = [0 : len(b[4]) - 1]) translate([b[4][i][0], b[4][i][1], postH - 1]) cylinder(d = b[5][i], h = b[3] + 2, $fn = 20);
  }
  %color("Black") translate([-as56IcL/2, -as56IcW/2, postH + b[3]]) cube([as56IcL, as56IcW, as56IcH]);
  %color("Silver") translate([0, 0, postH + b[3] + as56IcH + gap]) cylinder(d = as56MagnetD(magnet), h = as56MagnetT(magnet), $fn = 32);
}

module as56Holder(postH, board = "as5600-23", clearance = as56Clearance, lipH = as56LipH)
{
  b = as56Board(board);
  for (h = b[4]) translate([h[0], h[1], 0]) screwPost(b[6], postH, "head");
  //-- lips, sunk 0.01 into the floor so they don't come out as loose bodies
  translate([0, 0, -0.01]) linear_extrude(postH + lipH + 0.01)
    intersection()
    {
      difference() { as56Outline(board, clearance + as56LipWall); as56Outline(board, clearance); }
      as56LipZones(board, clearance);
    }
}

//-- headers: also cut a slot for header pins pointing down out of the board's back
module as56FloorCut(floorThick = as56FloorThick, board = "as5600-23", headers = false)
{
  b = as56Board(board);
  for (h = b[4]) translate([h[0], h[1], 0]) screwPostFloorCut(b[6], floorThick, "head");
  for (h = b[4]) assert(!headers || abs(h[0]) - screwPostDia(b[6])/2 >= as56HeaderSlot[0]/2
                         || abs(h[1]) - screwPostDia(b[6])/2 >= as56HeaderSlot[1]/2, "header slot runs into a post");
  if (headers) translate([-as56HeaderSlot[0]/2, -as56HeaderSlot[1]/2, -floorThick - 1])
    cube([as56HeaderSlot[0], as56HeaderSlot[1], floorThick + 2]);
}
// main file
// Screws up from below, washers and nuts on top, as solids for the catalogue.
include <../as5600-mount.scad>
use <../../screw-post/screw-post.scad>

board = "as5600-23"; tipZ = 11; magnet = "6x1"; floorThick = 2.0; L = 10;
postH = as56PostH(as56MagnetFaceZ(tipZ, magnet), board = board);
b = as56Board(board); s = b[6];
top = postH + b[3];
for (h = b[4])
  translate([h[0], h[1], 0])
  {
    translate([0, 0, -floorThick]) cylinder(d = screwHeadDia(s), h = screwHeadH(s), $fn = 24);
    translate([0, 0, -floorThick + screwHeadH(s) - 0.01]) cylinder(d = screwDia(s), h = L + 0.01, $fn = 16);
    translate([0, 0, top]) difference() { cylinder(d = as56WasherD, h = as56WasherT, $fn = 24); translate([0, 0, -1]) cylinder(d = screwDia(s) + 0.2, h = 2, $fn = 16); }
    translate([0, 0, top + as56WasherT]) difference() { cylinder(d = screwNutAF(s)/cos(30), h = screwNutH(s), $fn = 6); translate([0, 0, -1]) cylinder(d = screwDia(s) - 0.01, h = 4, $fn = 16); }
  }
